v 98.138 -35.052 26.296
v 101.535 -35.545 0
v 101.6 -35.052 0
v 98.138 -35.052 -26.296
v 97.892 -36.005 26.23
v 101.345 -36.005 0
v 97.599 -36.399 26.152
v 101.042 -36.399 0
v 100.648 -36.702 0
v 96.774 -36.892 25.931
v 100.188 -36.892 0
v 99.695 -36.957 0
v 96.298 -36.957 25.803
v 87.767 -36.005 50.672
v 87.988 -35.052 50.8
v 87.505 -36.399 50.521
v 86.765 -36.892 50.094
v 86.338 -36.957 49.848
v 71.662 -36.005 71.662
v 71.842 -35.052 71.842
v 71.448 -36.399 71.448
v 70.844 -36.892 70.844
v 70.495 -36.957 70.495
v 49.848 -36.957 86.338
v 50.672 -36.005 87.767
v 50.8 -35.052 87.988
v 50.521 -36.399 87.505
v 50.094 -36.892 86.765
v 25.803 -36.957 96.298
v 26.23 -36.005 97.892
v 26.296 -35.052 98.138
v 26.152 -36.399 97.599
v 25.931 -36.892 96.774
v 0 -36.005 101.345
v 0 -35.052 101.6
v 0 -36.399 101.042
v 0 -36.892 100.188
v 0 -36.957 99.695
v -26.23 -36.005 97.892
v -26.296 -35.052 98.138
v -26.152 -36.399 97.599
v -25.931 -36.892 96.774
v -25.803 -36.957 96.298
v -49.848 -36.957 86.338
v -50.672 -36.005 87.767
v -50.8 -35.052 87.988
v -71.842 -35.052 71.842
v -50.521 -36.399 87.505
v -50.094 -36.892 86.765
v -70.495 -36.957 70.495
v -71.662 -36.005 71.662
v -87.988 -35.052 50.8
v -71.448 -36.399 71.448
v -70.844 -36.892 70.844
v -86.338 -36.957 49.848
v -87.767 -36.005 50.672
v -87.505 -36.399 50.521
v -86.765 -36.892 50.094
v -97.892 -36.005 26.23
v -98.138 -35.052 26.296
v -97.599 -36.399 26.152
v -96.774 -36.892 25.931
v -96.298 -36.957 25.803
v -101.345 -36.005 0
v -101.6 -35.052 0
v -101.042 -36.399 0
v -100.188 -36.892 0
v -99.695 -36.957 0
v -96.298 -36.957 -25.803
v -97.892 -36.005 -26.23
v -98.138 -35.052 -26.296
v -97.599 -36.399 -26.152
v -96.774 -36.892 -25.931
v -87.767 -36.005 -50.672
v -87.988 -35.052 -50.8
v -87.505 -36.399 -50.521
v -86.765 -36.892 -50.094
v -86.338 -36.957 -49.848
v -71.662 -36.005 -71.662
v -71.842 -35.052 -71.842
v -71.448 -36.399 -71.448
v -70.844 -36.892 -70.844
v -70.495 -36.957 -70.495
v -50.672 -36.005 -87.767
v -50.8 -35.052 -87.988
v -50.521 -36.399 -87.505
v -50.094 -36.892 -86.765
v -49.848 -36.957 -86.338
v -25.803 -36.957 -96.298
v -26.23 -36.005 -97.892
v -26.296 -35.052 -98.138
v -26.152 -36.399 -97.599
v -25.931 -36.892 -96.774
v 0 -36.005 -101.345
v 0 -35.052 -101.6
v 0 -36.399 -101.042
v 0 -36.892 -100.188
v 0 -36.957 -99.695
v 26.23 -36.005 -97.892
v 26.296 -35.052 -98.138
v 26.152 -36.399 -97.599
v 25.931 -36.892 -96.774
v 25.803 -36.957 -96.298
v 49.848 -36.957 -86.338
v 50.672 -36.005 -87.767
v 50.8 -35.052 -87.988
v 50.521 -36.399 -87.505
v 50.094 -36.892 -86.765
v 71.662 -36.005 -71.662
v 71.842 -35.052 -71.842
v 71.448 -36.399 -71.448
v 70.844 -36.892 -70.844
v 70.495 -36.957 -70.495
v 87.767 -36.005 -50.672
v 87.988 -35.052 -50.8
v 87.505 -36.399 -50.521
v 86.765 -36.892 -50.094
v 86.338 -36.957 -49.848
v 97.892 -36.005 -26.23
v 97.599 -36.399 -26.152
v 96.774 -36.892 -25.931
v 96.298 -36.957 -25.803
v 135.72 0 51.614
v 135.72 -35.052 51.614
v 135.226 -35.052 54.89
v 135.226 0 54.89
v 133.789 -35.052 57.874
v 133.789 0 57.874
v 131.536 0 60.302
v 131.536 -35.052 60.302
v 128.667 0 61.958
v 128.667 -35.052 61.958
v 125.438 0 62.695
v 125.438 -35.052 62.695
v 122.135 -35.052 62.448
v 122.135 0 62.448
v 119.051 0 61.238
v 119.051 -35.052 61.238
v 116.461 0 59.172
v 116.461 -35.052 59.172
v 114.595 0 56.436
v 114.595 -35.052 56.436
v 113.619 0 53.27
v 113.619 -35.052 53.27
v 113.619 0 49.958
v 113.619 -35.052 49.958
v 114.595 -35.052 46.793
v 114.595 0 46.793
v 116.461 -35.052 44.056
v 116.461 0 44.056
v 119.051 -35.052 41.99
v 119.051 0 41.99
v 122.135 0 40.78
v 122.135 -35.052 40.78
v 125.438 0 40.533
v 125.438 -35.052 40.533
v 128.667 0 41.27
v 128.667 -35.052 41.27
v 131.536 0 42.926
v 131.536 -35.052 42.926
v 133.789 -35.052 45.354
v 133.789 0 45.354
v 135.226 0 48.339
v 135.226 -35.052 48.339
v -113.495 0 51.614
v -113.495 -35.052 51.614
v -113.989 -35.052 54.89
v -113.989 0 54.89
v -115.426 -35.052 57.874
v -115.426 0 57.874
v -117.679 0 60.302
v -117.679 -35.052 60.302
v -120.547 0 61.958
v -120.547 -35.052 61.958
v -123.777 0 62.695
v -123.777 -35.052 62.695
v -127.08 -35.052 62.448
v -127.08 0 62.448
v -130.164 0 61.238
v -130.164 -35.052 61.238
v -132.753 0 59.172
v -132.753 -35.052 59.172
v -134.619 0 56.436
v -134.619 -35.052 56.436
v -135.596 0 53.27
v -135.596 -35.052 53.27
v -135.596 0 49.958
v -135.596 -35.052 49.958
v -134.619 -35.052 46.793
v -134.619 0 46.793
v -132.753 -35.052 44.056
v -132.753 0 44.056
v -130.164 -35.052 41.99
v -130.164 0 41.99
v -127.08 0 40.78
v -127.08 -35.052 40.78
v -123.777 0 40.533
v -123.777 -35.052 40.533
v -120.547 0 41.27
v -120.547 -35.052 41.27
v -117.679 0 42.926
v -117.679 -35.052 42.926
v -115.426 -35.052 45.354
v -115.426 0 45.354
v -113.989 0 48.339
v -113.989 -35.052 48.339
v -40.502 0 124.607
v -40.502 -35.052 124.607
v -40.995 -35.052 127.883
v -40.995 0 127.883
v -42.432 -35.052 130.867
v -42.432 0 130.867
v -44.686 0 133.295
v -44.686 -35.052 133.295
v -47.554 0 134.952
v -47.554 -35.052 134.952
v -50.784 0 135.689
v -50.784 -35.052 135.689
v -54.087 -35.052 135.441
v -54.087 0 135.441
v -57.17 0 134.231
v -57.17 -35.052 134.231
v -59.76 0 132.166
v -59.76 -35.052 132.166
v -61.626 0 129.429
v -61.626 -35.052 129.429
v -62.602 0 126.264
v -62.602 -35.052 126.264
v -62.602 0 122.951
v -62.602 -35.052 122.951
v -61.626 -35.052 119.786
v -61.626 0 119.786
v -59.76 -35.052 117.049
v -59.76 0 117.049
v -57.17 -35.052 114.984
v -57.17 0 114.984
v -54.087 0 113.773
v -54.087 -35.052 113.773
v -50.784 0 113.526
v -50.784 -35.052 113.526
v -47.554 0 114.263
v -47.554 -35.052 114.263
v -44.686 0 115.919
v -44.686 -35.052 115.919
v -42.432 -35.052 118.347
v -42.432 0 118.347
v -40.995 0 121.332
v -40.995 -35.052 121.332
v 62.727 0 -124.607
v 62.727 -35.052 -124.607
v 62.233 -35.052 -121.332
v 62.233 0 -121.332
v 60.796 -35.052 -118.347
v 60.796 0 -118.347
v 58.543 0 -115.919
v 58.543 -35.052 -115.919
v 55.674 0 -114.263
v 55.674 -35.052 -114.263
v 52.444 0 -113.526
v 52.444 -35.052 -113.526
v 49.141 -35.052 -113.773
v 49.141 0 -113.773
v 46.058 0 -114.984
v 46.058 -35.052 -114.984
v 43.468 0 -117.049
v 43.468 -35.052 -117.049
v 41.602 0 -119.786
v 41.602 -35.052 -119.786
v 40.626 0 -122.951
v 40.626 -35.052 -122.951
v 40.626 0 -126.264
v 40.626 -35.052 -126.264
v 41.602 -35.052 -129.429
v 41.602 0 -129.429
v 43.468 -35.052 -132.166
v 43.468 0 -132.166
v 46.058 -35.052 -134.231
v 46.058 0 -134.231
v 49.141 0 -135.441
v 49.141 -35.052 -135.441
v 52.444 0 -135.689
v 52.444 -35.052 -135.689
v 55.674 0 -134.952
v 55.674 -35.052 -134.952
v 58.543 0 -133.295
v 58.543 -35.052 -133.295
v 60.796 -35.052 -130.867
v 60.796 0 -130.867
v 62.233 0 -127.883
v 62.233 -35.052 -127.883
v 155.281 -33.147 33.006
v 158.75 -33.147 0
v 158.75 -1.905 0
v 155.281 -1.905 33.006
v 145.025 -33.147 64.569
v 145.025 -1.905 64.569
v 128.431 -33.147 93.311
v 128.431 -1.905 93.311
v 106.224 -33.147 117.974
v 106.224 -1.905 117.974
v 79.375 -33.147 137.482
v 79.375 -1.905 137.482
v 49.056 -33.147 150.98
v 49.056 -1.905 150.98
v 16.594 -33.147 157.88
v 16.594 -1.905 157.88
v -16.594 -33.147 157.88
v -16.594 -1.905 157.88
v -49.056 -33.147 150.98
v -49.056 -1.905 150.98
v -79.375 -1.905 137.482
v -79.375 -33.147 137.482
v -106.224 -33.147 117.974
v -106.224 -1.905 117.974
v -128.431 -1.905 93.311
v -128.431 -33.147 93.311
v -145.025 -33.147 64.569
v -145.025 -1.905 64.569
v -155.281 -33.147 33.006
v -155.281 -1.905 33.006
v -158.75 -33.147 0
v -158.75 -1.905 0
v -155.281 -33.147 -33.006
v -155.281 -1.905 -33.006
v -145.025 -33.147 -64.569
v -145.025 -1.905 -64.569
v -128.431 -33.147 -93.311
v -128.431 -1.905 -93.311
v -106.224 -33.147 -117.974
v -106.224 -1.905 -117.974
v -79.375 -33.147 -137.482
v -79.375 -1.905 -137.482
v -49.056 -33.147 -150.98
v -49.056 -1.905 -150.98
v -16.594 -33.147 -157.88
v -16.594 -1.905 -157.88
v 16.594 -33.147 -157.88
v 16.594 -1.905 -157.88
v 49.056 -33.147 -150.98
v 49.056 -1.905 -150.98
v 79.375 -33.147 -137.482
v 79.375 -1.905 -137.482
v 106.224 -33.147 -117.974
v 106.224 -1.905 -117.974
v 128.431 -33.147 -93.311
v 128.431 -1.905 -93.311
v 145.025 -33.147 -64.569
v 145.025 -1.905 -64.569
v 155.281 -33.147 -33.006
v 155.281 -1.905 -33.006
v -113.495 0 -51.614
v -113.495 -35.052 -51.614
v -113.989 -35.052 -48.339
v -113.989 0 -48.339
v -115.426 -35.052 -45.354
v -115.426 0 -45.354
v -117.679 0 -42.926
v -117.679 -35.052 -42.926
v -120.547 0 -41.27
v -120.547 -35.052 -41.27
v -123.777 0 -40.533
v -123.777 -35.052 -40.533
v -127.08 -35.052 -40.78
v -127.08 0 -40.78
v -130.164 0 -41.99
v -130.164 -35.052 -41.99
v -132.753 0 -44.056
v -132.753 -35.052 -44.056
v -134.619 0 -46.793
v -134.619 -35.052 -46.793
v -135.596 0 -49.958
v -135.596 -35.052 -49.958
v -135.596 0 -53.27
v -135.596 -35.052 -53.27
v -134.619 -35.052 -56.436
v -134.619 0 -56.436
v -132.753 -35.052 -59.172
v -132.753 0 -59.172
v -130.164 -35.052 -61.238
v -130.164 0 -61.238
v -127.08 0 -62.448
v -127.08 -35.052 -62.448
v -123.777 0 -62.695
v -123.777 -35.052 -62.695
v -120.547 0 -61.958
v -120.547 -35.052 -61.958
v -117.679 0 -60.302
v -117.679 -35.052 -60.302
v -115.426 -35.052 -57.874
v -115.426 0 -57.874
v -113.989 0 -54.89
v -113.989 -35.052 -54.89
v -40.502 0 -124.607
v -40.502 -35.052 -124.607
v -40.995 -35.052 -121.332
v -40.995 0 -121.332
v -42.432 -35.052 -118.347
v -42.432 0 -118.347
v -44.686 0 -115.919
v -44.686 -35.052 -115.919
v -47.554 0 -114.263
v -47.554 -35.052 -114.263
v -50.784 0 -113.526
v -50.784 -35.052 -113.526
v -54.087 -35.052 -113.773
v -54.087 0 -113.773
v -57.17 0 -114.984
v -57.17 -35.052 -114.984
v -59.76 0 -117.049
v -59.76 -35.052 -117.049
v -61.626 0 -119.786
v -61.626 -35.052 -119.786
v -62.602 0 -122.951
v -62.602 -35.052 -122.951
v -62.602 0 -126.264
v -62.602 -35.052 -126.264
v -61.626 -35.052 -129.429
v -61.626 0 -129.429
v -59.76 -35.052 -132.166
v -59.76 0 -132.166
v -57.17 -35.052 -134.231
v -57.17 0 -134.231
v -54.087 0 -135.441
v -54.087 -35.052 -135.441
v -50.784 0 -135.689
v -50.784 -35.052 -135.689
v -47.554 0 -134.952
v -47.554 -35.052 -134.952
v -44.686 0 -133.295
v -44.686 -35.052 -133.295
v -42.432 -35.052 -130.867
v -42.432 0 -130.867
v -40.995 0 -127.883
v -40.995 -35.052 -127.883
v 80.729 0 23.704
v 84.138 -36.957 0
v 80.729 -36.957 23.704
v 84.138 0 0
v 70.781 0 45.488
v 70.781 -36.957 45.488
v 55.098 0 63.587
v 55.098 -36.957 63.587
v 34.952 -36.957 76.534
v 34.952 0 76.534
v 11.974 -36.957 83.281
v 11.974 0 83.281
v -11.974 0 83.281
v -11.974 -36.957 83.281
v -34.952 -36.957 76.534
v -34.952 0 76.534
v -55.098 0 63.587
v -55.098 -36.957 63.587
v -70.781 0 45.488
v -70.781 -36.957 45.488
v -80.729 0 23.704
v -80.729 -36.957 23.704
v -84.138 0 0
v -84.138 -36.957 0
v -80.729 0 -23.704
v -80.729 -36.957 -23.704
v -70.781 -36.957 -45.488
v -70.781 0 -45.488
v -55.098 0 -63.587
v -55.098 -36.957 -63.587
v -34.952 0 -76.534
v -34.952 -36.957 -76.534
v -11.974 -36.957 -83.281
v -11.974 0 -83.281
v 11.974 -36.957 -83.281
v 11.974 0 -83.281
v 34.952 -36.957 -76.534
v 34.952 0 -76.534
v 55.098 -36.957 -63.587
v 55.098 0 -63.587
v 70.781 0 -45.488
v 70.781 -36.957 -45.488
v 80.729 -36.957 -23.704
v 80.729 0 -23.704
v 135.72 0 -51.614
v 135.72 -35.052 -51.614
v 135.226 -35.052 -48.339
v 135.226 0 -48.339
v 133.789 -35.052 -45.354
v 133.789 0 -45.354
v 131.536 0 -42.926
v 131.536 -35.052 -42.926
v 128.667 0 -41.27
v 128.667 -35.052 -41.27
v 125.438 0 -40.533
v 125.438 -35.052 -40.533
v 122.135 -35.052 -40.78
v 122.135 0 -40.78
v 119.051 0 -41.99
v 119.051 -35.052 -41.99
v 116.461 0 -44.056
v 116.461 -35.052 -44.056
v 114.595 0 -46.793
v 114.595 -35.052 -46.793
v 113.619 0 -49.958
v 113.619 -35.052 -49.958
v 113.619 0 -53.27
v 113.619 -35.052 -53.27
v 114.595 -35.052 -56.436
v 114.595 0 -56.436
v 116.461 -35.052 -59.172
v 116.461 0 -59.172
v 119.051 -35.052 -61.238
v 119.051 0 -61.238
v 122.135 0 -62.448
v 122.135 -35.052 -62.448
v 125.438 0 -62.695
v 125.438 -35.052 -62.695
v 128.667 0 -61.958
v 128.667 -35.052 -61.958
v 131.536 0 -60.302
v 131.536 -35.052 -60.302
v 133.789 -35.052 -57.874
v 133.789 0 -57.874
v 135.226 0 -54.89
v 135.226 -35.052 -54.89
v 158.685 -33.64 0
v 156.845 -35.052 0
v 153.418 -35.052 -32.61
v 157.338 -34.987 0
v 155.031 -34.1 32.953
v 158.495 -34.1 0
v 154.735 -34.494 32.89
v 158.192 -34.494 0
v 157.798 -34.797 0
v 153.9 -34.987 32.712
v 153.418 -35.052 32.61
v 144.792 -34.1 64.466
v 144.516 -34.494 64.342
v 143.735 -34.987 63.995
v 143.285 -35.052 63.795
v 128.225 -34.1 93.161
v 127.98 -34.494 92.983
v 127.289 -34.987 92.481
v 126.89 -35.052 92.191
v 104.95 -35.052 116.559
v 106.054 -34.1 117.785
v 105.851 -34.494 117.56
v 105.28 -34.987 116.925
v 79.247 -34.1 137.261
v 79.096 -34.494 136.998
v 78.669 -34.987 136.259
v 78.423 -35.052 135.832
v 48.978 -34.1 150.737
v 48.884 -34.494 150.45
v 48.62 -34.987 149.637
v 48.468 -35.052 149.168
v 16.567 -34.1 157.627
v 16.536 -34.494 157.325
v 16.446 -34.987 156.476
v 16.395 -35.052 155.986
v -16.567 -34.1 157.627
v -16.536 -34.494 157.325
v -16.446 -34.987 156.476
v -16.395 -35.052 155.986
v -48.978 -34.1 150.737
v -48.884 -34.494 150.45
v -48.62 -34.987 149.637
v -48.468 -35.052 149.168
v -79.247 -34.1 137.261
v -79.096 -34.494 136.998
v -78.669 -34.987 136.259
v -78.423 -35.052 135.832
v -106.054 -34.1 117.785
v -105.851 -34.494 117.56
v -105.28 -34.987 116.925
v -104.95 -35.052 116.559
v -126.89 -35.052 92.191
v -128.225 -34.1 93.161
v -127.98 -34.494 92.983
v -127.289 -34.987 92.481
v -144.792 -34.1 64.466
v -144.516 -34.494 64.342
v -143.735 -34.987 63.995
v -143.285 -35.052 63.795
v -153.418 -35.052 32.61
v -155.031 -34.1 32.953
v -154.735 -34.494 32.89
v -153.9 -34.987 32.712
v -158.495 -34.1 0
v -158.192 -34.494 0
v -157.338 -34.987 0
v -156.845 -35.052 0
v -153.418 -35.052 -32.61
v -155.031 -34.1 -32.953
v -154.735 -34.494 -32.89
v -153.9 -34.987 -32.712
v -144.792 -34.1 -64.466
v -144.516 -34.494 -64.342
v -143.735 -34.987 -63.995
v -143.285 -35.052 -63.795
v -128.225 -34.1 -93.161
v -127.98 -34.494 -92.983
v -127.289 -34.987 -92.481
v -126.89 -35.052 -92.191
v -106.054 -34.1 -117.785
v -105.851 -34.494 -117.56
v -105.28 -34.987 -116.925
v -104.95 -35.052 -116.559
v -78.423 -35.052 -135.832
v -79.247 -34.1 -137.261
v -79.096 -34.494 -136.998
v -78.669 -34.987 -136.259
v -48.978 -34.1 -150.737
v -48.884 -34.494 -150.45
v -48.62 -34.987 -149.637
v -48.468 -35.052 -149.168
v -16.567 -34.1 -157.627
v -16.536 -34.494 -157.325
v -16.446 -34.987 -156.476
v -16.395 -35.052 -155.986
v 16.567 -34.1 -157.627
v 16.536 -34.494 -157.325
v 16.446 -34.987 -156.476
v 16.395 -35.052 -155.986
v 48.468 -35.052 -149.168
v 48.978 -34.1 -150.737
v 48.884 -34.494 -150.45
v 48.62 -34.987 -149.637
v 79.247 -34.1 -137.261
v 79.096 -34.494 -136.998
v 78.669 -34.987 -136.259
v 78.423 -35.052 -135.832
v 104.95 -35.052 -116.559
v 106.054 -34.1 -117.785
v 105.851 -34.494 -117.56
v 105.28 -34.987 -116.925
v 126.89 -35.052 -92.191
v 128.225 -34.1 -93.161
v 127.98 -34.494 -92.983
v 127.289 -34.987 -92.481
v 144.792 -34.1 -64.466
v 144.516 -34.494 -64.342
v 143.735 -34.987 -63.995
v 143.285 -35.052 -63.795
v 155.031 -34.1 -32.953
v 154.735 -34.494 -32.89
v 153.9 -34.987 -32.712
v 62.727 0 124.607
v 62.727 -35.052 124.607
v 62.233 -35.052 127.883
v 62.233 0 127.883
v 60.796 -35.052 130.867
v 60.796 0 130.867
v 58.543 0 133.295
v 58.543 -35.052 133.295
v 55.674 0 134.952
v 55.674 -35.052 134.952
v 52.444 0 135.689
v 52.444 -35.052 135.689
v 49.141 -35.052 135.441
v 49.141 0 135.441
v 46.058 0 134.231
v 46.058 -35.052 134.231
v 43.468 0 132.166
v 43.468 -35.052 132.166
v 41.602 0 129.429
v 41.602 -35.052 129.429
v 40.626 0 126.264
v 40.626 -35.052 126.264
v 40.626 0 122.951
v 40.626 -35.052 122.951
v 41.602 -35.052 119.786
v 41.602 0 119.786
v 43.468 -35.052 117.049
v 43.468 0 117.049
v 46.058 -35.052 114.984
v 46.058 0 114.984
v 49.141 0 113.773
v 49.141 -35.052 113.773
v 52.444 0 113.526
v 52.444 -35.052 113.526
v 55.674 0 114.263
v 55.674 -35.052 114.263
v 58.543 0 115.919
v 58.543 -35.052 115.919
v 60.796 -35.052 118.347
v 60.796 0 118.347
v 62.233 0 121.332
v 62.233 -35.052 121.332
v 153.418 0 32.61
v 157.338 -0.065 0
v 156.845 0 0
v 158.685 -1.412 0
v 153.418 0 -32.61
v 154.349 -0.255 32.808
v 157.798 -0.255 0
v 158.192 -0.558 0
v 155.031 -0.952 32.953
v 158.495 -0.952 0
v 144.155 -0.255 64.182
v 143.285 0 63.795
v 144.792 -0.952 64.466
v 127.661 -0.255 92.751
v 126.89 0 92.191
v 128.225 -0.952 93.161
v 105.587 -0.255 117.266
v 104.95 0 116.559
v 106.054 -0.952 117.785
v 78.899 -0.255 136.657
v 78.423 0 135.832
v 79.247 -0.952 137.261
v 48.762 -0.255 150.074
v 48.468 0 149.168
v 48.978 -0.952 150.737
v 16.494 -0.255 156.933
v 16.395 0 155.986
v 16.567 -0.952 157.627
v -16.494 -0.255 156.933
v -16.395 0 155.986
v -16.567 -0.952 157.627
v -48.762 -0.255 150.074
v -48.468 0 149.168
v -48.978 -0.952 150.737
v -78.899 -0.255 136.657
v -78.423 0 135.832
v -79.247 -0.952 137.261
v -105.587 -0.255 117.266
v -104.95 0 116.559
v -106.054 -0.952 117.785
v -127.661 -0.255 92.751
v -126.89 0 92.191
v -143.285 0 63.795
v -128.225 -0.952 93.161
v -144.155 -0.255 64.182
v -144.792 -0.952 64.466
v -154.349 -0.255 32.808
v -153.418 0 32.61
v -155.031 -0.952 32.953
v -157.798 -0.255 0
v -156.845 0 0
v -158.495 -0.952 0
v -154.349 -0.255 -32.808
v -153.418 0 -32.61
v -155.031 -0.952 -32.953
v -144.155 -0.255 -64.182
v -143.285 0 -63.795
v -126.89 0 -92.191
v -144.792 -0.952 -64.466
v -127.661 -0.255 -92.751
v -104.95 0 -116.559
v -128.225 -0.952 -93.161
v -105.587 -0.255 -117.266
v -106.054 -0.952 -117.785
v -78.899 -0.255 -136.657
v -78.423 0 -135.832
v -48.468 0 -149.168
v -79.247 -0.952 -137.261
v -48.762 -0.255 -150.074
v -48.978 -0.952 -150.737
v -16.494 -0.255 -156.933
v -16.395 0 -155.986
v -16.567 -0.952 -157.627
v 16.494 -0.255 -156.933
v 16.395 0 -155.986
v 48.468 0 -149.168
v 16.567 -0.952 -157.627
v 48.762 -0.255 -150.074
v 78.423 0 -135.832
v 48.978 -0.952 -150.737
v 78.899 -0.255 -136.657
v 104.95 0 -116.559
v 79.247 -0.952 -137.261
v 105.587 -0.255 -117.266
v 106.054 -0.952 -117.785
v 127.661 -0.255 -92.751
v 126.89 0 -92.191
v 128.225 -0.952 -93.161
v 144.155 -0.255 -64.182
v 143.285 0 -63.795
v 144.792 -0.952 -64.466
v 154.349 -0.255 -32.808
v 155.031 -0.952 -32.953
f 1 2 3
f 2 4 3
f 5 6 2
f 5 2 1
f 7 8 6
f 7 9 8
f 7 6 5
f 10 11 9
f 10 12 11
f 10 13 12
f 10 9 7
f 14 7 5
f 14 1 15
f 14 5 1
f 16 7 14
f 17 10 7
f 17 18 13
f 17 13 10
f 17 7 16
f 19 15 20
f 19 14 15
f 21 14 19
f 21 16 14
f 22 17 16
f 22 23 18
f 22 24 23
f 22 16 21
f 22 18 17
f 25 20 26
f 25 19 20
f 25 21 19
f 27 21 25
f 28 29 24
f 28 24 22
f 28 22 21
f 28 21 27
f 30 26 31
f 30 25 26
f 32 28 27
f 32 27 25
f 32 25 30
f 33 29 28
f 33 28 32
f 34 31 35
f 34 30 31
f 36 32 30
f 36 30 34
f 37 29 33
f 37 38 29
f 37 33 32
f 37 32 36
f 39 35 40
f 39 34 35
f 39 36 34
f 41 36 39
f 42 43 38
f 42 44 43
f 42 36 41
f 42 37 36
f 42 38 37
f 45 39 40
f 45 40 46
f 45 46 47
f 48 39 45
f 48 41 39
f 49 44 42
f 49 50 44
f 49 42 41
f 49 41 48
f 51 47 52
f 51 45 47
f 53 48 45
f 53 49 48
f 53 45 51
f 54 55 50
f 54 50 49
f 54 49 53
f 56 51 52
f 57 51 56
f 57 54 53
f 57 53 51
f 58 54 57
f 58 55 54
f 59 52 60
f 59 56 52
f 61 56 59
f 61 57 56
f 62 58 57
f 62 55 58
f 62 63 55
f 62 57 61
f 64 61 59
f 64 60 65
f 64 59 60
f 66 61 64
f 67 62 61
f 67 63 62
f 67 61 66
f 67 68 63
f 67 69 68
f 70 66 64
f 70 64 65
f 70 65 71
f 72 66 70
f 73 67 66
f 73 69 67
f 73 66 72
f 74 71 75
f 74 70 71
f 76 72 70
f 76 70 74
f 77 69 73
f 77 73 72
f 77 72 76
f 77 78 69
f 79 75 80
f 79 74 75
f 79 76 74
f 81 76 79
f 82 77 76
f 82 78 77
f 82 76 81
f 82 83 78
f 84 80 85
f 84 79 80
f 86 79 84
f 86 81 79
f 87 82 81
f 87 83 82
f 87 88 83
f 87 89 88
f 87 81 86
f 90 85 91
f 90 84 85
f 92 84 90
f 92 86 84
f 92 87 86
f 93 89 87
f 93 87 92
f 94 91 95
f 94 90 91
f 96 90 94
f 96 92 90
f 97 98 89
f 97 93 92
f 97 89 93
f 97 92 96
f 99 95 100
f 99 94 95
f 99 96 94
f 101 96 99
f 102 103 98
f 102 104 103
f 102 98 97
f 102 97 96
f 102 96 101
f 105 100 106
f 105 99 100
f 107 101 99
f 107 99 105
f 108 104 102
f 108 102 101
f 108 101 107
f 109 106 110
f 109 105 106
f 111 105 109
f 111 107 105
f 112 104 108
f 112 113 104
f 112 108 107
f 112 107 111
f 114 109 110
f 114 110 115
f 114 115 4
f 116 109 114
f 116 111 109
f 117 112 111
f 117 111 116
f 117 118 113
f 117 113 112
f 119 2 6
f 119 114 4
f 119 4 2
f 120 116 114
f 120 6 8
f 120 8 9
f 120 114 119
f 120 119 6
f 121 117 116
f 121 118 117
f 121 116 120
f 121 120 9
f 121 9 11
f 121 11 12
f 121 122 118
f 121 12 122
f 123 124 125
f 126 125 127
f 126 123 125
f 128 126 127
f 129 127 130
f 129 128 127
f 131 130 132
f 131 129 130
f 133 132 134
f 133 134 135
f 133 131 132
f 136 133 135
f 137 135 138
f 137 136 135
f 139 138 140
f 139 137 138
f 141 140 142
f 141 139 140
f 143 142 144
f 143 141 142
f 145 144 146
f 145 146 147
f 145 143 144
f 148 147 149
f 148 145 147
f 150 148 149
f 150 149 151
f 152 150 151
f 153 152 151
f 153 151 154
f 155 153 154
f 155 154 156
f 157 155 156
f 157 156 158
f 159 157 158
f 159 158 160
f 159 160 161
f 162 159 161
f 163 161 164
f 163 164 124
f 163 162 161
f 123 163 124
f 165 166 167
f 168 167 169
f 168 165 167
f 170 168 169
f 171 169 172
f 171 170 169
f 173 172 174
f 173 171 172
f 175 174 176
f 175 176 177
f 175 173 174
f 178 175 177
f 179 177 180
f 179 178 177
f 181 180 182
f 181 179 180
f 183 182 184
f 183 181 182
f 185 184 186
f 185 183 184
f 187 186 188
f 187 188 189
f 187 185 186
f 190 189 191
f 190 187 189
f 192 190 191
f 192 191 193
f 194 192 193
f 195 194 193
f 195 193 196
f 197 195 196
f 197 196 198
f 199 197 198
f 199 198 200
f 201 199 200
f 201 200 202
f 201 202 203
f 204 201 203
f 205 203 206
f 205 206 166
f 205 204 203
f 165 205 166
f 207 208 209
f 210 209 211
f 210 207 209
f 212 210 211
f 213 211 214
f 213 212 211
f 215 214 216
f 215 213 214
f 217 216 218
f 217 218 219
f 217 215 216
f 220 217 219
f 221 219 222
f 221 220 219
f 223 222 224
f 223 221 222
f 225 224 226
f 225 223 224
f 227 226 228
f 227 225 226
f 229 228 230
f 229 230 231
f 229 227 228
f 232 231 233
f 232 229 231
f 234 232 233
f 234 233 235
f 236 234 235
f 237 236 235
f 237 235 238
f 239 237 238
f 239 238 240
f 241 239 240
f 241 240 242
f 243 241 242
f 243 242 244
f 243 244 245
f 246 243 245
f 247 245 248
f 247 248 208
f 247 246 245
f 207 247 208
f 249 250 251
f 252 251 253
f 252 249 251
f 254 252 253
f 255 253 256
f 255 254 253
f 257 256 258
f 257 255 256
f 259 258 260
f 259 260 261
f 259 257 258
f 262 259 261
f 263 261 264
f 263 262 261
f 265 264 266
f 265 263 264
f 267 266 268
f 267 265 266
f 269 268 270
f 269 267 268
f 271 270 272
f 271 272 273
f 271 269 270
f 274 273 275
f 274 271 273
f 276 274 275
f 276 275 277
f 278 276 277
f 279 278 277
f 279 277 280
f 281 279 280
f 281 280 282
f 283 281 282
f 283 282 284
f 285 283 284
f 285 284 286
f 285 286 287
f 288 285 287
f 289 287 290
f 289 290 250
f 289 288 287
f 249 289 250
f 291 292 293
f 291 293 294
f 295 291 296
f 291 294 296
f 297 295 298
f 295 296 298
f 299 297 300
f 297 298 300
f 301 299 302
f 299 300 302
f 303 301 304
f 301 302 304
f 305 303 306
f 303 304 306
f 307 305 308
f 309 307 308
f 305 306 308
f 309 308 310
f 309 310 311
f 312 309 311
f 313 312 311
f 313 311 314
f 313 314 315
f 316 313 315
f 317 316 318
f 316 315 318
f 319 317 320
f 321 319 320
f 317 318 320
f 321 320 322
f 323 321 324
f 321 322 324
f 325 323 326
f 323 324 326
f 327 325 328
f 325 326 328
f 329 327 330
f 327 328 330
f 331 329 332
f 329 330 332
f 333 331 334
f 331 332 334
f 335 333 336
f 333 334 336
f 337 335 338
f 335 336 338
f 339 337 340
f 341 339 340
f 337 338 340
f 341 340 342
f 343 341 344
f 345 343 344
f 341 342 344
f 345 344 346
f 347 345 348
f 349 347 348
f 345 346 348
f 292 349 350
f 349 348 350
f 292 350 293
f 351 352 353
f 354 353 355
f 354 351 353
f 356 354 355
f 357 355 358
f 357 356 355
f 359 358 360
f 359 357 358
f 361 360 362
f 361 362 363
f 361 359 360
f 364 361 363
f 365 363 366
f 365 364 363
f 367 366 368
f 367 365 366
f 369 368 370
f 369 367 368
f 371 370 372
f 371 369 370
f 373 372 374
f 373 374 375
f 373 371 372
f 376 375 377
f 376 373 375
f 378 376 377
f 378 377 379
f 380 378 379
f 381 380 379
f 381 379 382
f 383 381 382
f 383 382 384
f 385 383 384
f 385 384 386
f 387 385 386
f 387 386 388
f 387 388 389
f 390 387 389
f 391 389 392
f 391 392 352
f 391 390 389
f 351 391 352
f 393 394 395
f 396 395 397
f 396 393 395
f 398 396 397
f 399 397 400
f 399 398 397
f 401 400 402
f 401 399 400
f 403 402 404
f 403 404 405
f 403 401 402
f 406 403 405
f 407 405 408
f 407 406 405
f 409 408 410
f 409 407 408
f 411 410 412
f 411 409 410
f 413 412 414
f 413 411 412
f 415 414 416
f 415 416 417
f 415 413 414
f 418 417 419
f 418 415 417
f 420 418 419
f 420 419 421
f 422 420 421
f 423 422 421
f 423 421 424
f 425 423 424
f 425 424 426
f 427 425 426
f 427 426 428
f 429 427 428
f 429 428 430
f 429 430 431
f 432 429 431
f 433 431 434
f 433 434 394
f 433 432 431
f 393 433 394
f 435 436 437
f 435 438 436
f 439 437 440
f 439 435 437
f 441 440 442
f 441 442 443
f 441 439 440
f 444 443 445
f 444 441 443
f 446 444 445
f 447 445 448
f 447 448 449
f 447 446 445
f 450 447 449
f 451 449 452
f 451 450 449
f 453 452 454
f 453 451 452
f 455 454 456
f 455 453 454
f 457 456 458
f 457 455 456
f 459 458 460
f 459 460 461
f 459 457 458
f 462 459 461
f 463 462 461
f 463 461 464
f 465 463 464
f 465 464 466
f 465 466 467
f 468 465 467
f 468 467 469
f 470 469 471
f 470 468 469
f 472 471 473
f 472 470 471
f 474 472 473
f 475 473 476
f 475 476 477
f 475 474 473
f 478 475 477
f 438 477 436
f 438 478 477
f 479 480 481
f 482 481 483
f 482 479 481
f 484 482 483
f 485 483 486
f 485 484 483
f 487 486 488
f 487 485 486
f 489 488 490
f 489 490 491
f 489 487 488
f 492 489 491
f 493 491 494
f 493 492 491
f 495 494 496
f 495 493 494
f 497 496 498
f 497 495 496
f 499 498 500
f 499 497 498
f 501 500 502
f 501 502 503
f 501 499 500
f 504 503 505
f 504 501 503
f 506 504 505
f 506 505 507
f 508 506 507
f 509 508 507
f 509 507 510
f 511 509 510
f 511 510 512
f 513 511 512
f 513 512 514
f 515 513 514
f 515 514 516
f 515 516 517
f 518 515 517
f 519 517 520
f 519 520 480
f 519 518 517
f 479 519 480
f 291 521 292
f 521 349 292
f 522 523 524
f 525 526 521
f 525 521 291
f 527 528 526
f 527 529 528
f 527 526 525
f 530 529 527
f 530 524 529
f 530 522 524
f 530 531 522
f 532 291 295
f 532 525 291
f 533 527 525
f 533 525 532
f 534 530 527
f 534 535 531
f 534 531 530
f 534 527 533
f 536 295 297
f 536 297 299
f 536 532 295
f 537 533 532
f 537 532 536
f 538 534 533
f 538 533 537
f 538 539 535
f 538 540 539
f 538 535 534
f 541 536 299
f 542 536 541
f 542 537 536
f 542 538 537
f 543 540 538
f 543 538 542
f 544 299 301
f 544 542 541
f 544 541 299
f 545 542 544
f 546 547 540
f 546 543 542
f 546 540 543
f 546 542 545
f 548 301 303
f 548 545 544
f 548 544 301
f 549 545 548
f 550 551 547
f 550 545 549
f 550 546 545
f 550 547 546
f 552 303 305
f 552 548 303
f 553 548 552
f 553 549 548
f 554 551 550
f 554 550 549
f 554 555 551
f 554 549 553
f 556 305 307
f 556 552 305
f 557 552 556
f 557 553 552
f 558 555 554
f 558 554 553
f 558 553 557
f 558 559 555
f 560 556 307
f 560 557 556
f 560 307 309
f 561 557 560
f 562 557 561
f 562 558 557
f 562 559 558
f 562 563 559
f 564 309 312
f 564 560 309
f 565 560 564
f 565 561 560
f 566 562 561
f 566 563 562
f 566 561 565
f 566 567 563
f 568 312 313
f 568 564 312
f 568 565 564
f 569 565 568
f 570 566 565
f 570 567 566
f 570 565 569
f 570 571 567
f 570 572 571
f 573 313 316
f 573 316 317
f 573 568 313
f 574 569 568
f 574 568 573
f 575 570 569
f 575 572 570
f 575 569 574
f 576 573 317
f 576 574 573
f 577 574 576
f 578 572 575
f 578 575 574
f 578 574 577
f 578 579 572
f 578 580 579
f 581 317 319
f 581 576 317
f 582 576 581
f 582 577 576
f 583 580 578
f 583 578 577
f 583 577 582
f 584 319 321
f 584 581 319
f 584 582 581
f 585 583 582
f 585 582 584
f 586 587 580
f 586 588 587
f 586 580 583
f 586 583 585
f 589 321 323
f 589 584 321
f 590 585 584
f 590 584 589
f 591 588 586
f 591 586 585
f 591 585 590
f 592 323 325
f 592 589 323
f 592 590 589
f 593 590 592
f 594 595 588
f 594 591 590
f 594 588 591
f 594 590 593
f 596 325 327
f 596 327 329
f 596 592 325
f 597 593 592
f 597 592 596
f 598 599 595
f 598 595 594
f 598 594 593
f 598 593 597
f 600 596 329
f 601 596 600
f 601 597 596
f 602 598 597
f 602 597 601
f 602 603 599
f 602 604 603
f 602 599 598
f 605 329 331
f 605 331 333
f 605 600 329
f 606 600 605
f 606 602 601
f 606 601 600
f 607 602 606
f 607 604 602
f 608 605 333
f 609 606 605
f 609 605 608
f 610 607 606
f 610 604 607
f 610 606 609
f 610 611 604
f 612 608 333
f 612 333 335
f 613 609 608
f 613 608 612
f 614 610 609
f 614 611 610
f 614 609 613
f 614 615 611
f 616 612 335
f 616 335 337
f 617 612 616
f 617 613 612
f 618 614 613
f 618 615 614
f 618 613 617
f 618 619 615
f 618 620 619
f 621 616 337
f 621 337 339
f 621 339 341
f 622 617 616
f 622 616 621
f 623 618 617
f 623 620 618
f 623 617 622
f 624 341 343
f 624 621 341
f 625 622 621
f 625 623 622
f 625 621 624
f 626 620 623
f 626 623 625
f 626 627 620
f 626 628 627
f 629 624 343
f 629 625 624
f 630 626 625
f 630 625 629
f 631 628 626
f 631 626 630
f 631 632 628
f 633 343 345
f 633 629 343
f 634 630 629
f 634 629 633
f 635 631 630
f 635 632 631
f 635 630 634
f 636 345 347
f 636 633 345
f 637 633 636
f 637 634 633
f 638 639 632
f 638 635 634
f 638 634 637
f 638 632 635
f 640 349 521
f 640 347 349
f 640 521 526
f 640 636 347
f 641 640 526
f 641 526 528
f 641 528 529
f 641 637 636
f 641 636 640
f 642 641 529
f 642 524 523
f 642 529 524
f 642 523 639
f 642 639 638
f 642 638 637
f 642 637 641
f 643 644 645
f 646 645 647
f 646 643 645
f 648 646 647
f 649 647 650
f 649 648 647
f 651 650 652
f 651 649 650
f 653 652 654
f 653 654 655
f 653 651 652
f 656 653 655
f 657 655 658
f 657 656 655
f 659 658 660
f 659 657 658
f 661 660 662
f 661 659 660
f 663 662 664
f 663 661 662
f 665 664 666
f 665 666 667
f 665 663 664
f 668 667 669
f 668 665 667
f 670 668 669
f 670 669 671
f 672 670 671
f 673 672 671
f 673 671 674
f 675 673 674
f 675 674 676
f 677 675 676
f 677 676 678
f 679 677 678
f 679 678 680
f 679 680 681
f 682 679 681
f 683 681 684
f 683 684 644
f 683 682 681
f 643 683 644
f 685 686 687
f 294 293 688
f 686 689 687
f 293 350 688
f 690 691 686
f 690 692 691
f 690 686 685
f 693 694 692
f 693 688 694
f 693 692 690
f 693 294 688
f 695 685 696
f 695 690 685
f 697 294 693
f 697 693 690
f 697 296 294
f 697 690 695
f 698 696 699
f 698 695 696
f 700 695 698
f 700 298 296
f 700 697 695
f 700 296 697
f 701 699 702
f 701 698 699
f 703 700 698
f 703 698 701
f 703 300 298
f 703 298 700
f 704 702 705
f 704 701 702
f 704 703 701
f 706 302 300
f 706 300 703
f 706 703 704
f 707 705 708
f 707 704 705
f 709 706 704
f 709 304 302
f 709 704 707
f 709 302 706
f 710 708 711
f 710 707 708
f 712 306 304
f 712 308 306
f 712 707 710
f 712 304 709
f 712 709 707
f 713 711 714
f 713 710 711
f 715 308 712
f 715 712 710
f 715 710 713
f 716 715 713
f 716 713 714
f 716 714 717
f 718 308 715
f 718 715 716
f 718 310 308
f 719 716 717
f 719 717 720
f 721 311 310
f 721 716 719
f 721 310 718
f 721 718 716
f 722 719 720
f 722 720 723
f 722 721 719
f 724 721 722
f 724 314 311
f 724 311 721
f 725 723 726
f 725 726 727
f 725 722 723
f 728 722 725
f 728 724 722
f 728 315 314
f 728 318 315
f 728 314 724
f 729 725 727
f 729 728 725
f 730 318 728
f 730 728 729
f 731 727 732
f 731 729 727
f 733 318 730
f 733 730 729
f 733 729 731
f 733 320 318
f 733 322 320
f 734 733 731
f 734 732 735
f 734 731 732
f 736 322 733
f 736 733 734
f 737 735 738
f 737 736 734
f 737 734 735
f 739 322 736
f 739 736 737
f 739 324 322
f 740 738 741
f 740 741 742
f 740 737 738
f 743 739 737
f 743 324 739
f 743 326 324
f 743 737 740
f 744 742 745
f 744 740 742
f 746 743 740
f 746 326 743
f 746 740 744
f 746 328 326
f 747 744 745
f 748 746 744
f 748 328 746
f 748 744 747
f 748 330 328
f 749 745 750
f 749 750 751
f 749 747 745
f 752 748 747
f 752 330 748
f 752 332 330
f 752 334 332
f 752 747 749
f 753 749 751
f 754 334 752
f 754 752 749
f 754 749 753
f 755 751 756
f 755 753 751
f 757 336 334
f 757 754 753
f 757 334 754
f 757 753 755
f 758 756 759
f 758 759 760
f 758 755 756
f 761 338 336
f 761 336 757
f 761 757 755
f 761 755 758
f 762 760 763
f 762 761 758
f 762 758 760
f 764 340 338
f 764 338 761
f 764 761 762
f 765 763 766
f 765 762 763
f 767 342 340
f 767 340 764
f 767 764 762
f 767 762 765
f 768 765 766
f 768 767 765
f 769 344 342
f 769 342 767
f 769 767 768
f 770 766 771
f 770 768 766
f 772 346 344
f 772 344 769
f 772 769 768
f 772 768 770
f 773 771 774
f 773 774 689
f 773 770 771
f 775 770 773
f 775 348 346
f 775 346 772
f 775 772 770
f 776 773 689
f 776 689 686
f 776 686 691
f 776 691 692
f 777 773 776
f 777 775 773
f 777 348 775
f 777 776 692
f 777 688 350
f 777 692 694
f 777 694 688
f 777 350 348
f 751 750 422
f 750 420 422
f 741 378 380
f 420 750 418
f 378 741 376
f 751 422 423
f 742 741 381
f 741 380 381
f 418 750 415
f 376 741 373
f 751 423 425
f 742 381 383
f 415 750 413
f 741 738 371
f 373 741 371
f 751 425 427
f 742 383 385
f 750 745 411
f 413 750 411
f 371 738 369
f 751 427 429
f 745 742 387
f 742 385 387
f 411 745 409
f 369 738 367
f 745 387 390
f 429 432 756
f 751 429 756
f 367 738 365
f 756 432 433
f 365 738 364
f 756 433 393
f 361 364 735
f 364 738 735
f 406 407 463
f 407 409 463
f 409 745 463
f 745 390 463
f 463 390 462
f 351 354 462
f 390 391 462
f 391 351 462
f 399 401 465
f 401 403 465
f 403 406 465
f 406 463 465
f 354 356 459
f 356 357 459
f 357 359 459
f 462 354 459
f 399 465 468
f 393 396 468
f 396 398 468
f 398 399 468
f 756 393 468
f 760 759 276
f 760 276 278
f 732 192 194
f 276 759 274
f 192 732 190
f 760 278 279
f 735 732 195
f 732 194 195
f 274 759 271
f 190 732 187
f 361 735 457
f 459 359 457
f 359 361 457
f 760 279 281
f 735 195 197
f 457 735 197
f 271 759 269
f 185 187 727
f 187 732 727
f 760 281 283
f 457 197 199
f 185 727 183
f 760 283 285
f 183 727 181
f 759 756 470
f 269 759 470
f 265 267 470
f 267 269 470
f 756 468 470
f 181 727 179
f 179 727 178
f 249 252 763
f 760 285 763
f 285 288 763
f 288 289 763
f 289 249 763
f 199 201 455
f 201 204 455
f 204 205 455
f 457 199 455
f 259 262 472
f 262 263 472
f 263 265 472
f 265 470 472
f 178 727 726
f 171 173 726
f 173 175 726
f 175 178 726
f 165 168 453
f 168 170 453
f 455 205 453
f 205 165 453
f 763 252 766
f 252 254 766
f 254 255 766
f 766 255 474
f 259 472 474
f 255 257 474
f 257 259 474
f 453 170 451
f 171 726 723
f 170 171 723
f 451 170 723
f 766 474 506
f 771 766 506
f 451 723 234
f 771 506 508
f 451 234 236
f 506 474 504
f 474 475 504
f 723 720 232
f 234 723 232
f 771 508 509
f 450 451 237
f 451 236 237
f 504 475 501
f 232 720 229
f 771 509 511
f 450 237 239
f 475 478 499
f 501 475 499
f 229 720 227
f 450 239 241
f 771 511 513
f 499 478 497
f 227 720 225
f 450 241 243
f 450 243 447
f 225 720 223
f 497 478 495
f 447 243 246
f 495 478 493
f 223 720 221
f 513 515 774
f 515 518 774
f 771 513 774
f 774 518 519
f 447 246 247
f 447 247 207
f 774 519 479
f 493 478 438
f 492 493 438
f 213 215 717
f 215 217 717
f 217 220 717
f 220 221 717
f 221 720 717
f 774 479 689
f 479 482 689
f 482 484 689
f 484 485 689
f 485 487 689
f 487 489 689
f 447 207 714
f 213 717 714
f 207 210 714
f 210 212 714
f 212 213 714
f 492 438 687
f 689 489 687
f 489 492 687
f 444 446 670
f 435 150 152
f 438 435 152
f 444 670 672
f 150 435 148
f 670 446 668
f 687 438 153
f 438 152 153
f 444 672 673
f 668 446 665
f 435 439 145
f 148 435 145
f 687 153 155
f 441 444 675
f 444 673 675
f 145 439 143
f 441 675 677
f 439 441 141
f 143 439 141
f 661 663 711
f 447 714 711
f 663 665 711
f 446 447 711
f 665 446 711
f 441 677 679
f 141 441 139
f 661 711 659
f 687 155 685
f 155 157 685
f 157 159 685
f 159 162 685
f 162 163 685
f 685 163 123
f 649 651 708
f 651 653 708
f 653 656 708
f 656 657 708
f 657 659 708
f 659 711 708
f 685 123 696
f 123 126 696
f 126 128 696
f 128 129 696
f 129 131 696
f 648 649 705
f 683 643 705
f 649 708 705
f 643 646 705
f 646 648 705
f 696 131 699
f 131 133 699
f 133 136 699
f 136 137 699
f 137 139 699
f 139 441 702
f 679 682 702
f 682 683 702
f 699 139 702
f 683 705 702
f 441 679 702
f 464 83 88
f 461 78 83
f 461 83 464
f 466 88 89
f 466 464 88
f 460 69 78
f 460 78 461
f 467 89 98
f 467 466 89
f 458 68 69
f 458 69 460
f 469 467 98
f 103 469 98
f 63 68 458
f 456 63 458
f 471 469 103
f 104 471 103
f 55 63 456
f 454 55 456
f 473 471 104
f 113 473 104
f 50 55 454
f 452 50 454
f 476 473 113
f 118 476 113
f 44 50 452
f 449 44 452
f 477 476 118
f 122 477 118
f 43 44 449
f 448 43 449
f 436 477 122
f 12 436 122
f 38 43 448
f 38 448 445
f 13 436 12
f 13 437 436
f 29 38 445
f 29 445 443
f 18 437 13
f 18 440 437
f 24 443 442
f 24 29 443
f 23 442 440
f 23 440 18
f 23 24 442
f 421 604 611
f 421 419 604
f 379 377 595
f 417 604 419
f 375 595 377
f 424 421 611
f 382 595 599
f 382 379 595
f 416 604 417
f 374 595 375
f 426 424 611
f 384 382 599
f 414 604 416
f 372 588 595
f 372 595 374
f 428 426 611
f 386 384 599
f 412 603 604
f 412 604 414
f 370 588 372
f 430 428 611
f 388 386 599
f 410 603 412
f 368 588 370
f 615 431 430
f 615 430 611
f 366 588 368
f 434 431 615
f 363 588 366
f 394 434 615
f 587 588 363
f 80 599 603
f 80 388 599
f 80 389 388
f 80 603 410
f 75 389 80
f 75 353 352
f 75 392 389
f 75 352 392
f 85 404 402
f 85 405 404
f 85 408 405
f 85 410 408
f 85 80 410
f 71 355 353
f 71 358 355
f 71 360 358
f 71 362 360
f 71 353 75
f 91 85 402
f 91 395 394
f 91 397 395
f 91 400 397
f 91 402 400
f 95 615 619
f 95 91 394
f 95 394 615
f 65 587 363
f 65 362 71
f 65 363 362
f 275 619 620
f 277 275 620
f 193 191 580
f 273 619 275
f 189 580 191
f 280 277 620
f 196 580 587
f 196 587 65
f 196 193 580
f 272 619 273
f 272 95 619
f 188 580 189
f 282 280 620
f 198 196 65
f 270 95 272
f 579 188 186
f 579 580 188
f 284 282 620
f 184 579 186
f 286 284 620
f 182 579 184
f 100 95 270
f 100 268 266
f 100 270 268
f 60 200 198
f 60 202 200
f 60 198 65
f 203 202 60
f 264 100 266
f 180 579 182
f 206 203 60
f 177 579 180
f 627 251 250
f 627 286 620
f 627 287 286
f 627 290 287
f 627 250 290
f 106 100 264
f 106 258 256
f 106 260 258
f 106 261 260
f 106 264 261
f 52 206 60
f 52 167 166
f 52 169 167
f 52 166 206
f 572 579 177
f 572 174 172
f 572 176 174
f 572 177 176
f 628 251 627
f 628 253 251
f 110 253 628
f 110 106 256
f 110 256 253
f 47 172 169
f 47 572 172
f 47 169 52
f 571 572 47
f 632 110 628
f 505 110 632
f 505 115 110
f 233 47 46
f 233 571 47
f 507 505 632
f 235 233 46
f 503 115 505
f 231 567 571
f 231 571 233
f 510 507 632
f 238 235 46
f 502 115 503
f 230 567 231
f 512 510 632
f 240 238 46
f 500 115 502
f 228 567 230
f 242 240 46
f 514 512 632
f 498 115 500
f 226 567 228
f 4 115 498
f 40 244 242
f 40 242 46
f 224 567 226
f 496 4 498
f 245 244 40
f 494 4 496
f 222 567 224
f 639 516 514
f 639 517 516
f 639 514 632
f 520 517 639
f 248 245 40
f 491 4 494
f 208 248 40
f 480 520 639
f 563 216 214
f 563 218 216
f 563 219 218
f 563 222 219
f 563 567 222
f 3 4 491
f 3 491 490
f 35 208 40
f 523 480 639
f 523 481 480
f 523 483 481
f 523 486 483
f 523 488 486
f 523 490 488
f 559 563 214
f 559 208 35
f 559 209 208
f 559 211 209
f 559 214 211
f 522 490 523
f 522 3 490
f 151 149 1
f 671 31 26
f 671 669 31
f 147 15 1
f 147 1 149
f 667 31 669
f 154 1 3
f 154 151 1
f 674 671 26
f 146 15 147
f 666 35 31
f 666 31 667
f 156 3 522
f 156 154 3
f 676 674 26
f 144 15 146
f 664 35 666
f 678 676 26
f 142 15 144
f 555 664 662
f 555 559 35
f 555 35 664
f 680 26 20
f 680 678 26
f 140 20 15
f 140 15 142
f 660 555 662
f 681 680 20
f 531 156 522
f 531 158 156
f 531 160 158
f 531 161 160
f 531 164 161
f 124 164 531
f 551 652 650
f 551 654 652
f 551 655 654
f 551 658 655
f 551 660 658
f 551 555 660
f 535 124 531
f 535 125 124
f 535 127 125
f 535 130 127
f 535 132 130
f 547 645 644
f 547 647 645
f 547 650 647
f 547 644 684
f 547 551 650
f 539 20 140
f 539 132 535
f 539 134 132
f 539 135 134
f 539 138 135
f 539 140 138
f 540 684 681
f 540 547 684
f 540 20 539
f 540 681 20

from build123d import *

# Parameters (mm, degrees)
F0_R     = 158.75
F0_R_2   = 11.1125
F0_R_3   = 84.1375
F1_DEPTH = 35.052
F2_R     = 101.6
F2_R_2   = 84.1375
F3_DEPTH = 1.905
F4_R     = 1.90499


# Not quite as in the source:
# - a fillet or chamfer is up to 0.001 mm smaller than in the source, because OpenCascade refuses the exact size


with BuildPart() as f1:
    # F0 (on Front) → F1 (new body)
    with BuildSketch(Plane.XZ):
        Circle(F0_R)
        with Locations((-51.6140452568, -124.6073280679)):
            Circle(F0_R_2, mode=Mode.SUBTRACT)
        with Locations((-124.6073280679, -51.6140452568)):
            Circle(F0_R_2, mode=Mode.SUBTRACT)
        with Locations((51.6140452568, -124.6073280679)):
            Circle(F0_R_2, mode=Mode.SUBTRACT)
        with Locations((124.6073280679, -51.6140452568)):
            Circle(F0_R_2, mode=Mode.SUBTRACT)
        with Locations((-124.6073280679, 51.6140452568)):
            Circle(F0_R_2, mode=Mode.SUBTRACT)
        with Locations((-51.6140452568, 124.6073280679)):
            Circle(F0_R_2, mode=Mode.SUBTRACT)
        Circle(F0_R_3, mode=Mode.SUBTRACT)
        with Locations((124.6073280679, 51.6140452568)):
            Circle(F0_R_2, mode=Mode.SUBTRACT)
        with Locations((51.6140452568, 124.6073280679)):
            Circle(F0_R_2, mode=Mode.SUBTRACT)
    extrude(amount=F1_DEPTH)

    # F2 (on face) → F3 (join)
    with BuildSketch(Plane.XZ.offset(35.052)):
        Circle(F2_R)
        Circle(F2_R_2, mode=Mode.SUBTRACT)
    extrude(amount=F3_DEPTH)

    # F4 (radius 1.905 in the source; OpenCascade refuses exactly that, so slightly less here)
    f4_edges = [f1.edges().sort_by_distance(p)[0] for p in [
        (-158.75, -35.052, 0),
        (-158.75, 0, 0),
        (-101.6, -36.957, 0),
    ]]
    fillet(f4_edges, radius=F4_R)


solid = f1.part
